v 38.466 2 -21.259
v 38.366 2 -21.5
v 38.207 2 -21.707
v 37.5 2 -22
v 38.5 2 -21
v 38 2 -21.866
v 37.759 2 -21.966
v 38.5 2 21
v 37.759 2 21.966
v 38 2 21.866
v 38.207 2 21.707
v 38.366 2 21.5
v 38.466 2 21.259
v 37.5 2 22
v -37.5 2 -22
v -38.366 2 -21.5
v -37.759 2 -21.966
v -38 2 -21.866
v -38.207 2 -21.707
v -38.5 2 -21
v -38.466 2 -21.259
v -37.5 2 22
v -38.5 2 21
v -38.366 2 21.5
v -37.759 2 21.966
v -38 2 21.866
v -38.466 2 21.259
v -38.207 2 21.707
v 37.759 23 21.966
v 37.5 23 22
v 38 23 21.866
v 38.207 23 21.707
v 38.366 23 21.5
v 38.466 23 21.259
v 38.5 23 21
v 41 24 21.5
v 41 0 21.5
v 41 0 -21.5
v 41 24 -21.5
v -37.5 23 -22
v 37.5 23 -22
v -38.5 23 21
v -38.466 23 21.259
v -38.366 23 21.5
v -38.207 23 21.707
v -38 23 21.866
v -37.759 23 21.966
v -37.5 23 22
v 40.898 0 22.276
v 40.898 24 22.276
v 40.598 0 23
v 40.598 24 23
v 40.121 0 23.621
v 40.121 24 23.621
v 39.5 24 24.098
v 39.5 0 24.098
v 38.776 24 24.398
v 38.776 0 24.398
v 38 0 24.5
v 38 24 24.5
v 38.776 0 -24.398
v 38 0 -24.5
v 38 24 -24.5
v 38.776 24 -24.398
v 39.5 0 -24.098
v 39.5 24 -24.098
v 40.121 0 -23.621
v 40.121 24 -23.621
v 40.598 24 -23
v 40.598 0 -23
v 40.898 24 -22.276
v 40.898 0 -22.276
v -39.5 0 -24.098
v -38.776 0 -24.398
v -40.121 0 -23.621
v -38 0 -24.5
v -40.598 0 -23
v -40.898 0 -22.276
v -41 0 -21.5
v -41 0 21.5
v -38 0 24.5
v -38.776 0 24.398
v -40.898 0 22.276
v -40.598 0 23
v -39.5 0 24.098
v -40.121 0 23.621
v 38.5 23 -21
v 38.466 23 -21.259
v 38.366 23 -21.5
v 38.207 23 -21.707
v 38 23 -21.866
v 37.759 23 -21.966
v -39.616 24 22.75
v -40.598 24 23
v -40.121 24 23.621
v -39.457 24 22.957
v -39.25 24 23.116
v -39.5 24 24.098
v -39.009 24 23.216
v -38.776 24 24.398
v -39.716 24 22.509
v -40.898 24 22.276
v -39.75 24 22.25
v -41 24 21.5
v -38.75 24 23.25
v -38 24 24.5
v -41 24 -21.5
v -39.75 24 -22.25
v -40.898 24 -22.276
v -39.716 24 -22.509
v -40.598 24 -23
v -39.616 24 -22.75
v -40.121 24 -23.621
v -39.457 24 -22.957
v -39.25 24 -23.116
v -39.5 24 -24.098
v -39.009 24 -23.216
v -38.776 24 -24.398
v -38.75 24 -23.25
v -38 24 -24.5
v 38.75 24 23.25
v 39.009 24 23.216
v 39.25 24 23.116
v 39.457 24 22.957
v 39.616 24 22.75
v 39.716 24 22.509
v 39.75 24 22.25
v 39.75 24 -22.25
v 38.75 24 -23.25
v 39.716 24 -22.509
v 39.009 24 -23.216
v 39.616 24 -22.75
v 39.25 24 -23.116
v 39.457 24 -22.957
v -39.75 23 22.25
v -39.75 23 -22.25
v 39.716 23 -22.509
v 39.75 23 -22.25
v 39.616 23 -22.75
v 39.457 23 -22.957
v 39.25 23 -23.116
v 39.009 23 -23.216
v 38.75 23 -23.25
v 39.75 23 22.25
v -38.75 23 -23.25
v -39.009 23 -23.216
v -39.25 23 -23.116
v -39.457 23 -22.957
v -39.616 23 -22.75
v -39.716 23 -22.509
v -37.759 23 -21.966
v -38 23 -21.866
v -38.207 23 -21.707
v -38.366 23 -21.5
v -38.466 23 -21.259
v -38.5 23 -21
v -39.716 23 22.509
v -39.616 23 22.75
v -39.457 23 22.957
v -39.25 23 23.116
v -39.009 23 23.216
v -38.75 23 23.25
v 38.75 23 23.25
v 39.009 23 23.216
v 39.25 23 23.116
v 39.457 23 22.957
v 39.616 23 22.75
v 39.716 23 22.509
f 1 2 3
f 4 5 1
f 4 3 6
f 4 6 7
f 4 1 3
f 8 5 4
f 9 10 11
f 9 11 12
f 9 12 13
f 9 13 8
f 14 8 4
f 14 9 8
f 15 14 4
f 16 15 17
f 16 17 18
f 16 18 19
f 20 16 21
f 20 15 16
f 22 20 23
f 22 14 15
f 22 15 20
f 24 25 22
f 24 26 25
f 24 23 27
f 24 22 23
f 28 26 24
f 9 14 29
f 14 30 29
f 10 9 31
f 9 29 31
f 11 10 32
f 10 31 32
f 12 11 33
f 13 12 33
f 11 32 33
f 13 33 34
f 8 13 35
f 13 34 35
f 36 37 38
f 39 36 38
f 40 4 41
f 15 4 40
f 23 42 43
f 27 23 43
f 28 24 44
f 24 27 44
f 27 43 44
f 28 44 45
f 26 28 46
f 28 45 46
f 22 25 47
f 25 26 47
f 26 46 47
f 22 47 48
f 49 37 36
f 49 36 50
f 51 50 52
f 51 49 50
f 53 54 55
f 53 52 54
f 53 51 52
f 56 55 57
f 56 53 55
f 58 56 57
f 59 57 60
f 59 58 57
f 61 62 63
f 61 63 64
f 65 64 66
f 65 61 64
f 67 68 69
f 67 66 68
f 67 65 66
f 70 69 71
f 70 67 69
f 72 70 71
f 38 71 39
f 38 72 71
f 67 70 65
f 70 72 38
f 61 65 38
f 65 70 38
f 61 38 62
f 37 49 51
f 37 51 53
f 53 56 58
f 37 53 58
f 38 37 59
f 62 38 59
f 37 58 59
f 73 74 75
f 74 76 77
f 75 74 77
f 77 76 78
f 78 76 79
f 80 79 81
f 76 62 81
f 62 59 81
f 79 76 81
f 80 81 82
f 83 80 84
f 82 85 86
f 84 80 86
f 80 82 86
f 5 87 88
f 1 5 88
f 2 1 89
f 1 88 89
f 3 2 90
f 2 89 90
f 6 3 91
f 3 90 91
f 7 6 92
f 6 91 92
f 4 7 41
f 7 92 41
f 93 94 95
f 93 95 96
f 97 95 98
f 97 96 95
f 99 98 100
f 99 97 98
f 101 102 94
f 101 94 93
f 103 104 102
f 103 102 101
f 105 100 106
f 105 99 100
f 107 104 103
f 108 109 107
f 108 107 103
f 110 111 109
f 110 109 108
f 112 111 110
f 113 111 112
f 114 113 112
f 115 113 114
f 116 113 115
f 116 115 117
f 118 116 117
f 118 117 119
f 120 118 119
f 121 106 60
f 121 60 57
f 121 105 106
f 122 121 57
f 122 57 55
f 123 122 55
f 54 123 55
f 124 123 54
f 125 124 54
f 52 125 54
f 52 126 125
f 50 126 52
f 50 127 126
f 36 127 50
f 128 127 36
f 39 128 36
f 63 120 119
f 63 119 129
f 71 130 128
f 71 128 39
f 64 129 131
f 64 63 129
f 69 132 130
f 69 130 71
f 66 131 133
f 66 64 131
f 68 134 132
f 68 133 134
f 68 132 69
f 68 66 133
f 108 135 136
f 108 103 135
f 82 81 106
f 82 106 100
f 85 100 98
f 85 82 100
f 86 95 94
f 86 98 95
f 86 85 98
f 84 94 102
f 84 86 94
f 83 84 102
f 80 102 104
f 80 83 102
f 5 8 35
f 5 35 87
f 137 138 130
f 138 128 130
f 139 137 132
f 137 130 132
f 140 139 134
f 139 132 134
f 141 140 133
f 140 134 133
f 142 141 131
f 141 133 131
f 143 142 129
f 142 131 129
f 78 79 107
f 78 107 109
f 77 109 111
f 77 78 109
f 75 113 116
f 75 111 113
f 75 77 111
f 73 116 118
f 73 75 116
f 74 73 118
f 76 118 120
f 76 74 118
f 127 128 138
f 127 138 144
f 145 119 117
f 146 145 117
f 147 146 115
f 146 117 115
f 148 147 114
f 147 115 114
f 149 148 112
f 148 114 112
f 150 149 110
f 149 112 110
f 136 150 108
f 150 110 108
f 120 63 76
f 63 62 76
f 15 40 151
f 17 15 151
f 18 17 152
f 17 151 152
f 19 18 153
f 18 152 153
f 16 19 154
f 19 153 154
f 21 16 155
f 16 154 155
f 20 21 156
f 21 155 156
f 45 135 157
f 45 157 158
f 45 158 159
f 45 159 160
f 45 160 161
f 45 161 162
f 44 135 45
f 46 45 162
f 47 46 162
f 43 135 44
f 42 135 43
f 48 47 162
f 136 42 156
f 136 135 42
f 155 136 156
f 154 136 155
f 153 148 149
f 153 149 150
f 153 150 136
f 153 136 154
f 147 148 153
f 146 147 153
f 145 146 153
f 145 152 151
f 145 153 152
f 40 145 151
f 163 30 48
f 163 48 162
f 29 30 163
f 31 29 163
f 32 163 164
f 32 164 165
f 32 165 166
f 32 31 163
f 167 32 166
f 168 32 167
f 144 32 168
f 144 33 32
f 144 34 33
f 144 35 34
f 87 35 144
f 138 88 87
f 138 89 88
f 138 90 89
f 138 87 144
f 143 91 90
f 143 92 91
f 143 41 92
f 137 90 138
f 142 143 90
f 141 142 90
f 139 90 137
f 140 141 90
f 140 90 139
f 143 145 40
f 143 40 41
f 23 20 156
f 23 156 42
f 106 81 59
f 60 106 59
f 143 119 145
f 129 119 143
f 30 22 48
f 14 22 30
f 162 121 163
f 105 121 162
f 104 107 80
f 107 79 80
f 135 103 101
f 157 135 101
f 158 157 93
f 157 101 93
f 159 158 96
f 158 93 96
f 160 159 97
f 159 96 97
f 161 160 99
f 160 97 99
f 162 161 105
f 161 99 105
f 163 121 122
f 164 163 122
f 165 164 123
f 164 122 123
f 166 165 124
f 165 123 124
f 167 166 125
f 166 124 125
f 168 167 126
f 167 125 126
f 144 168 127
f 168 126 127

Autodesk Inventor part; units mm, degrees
ref_plane "YZ Plane" through (0, 0, 0) normal (1, 0, 0) x (0, 1, 0)
ref_plane "XZ Plane" through (0, 0, 0) normal (0, 1, 0) x (-1, 0, 0)
ref_plane "XY Plane" through (0, 0, 0) normal (0, 0, 1) x (1, 0, 0)
sketch "Sketch1" plane through (0, 0, 0) normal (0, 1, 0) x (-1, 0, 0)
  line L0 (-38.5, 22) -> (38.5, 22)
  line L1 (38.5, 22) -> (38.5, -22)
  line L2 (38.5, -22) -> (-38.5, -22)
  line L3 (-38.5, -22) -> (-38.5, 22)
  line L4 (-38.5, 22) -> (38.5, -22) construction
  line L5 (38.5, 22) -> (-38.5, -22) construction
  line L6 (38.5, -22) -> (-38.5, -22)
  line L7 (-38.5, -22) -> (-38.5, 21)
  line L8 (38.5, 21) -> (38.5, -22)
  line L9 (-38, 24.5) -> (38, 24.5)
  line L10 (41, 21.5) -> (41, -21.5)
  line L11 (38, -24.5) -> (-38, -24.5)
  line L12 (-41, -21.5) -> (-41, 21.5)
  line L13 (-41, 24.5) -> (41, -24.5) construction
  line L14 (41, 24.5) -> (-41, -24.5) construction
  arc A0 (41, 21.5) -> (38, 24.5) centre (38, 21.5) ccw
  arc A1 (38, -24.5) -> (41, -21.5) centre (38, -21.5) ccw
  arc A2 (-41, -21.5) -> (-38, -24.5) centre (-38, -21.5) ccw
  arc A3 (-38, 24.5) -> (-41, 21.5) centre (-38, 21.5) ccw
  point P0 (0, 0)
  dimension "d0" = 77
  dimension "d1" = 44
  dimension "d3" = 82
  dimension "d4" = 49
  dimension "d5" = 3
extrude "Extrusion1" add sketch "Sketch1" along normal blind 2 contours L0 L1 L2 L3 | L9 A0 L10 A1 L11 A2 L12 A3
sketch "Sketch22" plane through (0, 2, 0) normal (0, 1, 0) x (1, 0, 0)
  line L0 (38, 24.5) -> (-38, 24.5) projected
  arc A0 (-38, 24.5) -> (-41, 21.5) centre (-38, 21.5) ccw projected
  line L1 (-41, 21.5) -> (-41, -21.5) projected
  arc A1 (-41, -21.5) -> (-38, -24.5) centre (-38, -21.5) ccw projected
  line L2 (-38, -24.5) -> (38, -24.5) projected
  arc A2 (38, -24.5) -> (41, -21.5) centre (38, -21.5) ccw projected
  line L3 (41, -21.5) -> (41, 21.5) projected
  arc A3 (41, 21.5) -> (38, 24.5) centre (38, 21.5) ccw projected
  line L4 (-38.5, -22) -> (38.5, -22)
  line L5 (38.5, -22) -> (38.5, 22)
  line L6 (38.5, 22) -> (-38.5, 22)
  line L7 (-38.5, 22) -> (-38.5, -22)
  point P0 (0, 0)
  dimension "d80" = 2.5
  dimension "d81" = 2.5
  dimension "d82" = 2.5
  dimension "d83" = 2.5
extrude "Extrusion18" add sketch "Sketch22" along normal blind 22
fillet "Fillet5" radius 1 4 edges at (-38.5, 13, -22) (-38.5, 13, 22) (38.5, 13, 22) (38.5, 13, -22)
sketch "Sketch23" plane through (0, 24, 0) normal (0, 1, 0) x (1, 0, 0)
  line L0 (-38.75, 23.25) -> (38.75, 23.25)
  line L1 (39.75, 22.25) -> (39.75, -22.25)
  line L2 (38.75, -23.25) -> (-38.75, -23.25)
  line L3 (-39.75, -22.25) -> (-39.75, 22.25)
  line L4 (-39.75, 23.25) -> (39.75, -23.25) construction
  line L5 (39.75, 23.25) -> (-39.75, -23.25) construction
  line L6 (41, -21.5) -> (41, 21.5) projected
  line L7 (-38, -24.5) -> (38, -24.5) projected
  line L8 (-38.5, -21) -> (-38.5, 21) projected
  line L9 (-37.5, 22) -> (37.5, 22) projected
  line L10 (38.5, 21) -> (38.5, -21) projected
  line L11 (37.5, -22) -> (-37.5, -22) projected
  arc A0 (-38.5, -21) -> (-37.5, -22) centre (-37.5, -21) ccw projected
  arc A1 (-37.5, 22) -> (-38.5, 21) centre (-37.5, 21) ccw projected
  arc A2 (38.5, 21) -> (37.5, 22) centre (37.5, 21) ccw projected
  arc A3 (37.5, -22) -> (38.5, -21) centre (37.5, -21) ccw projected
  arc A4 (38.75, -23.25) -> (39.75, -22.25) centre (38.75, -22.25) ccw
  arc A5 (39.75, 22.25) -> (38.75, 23.25) centre (38.75, 22.25) ccw
  arc A6 (-38.75, 23.25) -> (-39.75, 22.25) centre (-38.75, 22.25) ccw
  arc A7 (-39.75, -22.25) -> (-38.75, -23.25) centre (-38.75, -22.25) ccw
  point P0 (0, 0)
  dimension "d87" = 1.25
  dimension "d88" = 1.25
  dimension "d91" = 1
extrude "Extrusion19" cut sketch "Sketch23" against normal blind 1
properties part number "Ver 1"
